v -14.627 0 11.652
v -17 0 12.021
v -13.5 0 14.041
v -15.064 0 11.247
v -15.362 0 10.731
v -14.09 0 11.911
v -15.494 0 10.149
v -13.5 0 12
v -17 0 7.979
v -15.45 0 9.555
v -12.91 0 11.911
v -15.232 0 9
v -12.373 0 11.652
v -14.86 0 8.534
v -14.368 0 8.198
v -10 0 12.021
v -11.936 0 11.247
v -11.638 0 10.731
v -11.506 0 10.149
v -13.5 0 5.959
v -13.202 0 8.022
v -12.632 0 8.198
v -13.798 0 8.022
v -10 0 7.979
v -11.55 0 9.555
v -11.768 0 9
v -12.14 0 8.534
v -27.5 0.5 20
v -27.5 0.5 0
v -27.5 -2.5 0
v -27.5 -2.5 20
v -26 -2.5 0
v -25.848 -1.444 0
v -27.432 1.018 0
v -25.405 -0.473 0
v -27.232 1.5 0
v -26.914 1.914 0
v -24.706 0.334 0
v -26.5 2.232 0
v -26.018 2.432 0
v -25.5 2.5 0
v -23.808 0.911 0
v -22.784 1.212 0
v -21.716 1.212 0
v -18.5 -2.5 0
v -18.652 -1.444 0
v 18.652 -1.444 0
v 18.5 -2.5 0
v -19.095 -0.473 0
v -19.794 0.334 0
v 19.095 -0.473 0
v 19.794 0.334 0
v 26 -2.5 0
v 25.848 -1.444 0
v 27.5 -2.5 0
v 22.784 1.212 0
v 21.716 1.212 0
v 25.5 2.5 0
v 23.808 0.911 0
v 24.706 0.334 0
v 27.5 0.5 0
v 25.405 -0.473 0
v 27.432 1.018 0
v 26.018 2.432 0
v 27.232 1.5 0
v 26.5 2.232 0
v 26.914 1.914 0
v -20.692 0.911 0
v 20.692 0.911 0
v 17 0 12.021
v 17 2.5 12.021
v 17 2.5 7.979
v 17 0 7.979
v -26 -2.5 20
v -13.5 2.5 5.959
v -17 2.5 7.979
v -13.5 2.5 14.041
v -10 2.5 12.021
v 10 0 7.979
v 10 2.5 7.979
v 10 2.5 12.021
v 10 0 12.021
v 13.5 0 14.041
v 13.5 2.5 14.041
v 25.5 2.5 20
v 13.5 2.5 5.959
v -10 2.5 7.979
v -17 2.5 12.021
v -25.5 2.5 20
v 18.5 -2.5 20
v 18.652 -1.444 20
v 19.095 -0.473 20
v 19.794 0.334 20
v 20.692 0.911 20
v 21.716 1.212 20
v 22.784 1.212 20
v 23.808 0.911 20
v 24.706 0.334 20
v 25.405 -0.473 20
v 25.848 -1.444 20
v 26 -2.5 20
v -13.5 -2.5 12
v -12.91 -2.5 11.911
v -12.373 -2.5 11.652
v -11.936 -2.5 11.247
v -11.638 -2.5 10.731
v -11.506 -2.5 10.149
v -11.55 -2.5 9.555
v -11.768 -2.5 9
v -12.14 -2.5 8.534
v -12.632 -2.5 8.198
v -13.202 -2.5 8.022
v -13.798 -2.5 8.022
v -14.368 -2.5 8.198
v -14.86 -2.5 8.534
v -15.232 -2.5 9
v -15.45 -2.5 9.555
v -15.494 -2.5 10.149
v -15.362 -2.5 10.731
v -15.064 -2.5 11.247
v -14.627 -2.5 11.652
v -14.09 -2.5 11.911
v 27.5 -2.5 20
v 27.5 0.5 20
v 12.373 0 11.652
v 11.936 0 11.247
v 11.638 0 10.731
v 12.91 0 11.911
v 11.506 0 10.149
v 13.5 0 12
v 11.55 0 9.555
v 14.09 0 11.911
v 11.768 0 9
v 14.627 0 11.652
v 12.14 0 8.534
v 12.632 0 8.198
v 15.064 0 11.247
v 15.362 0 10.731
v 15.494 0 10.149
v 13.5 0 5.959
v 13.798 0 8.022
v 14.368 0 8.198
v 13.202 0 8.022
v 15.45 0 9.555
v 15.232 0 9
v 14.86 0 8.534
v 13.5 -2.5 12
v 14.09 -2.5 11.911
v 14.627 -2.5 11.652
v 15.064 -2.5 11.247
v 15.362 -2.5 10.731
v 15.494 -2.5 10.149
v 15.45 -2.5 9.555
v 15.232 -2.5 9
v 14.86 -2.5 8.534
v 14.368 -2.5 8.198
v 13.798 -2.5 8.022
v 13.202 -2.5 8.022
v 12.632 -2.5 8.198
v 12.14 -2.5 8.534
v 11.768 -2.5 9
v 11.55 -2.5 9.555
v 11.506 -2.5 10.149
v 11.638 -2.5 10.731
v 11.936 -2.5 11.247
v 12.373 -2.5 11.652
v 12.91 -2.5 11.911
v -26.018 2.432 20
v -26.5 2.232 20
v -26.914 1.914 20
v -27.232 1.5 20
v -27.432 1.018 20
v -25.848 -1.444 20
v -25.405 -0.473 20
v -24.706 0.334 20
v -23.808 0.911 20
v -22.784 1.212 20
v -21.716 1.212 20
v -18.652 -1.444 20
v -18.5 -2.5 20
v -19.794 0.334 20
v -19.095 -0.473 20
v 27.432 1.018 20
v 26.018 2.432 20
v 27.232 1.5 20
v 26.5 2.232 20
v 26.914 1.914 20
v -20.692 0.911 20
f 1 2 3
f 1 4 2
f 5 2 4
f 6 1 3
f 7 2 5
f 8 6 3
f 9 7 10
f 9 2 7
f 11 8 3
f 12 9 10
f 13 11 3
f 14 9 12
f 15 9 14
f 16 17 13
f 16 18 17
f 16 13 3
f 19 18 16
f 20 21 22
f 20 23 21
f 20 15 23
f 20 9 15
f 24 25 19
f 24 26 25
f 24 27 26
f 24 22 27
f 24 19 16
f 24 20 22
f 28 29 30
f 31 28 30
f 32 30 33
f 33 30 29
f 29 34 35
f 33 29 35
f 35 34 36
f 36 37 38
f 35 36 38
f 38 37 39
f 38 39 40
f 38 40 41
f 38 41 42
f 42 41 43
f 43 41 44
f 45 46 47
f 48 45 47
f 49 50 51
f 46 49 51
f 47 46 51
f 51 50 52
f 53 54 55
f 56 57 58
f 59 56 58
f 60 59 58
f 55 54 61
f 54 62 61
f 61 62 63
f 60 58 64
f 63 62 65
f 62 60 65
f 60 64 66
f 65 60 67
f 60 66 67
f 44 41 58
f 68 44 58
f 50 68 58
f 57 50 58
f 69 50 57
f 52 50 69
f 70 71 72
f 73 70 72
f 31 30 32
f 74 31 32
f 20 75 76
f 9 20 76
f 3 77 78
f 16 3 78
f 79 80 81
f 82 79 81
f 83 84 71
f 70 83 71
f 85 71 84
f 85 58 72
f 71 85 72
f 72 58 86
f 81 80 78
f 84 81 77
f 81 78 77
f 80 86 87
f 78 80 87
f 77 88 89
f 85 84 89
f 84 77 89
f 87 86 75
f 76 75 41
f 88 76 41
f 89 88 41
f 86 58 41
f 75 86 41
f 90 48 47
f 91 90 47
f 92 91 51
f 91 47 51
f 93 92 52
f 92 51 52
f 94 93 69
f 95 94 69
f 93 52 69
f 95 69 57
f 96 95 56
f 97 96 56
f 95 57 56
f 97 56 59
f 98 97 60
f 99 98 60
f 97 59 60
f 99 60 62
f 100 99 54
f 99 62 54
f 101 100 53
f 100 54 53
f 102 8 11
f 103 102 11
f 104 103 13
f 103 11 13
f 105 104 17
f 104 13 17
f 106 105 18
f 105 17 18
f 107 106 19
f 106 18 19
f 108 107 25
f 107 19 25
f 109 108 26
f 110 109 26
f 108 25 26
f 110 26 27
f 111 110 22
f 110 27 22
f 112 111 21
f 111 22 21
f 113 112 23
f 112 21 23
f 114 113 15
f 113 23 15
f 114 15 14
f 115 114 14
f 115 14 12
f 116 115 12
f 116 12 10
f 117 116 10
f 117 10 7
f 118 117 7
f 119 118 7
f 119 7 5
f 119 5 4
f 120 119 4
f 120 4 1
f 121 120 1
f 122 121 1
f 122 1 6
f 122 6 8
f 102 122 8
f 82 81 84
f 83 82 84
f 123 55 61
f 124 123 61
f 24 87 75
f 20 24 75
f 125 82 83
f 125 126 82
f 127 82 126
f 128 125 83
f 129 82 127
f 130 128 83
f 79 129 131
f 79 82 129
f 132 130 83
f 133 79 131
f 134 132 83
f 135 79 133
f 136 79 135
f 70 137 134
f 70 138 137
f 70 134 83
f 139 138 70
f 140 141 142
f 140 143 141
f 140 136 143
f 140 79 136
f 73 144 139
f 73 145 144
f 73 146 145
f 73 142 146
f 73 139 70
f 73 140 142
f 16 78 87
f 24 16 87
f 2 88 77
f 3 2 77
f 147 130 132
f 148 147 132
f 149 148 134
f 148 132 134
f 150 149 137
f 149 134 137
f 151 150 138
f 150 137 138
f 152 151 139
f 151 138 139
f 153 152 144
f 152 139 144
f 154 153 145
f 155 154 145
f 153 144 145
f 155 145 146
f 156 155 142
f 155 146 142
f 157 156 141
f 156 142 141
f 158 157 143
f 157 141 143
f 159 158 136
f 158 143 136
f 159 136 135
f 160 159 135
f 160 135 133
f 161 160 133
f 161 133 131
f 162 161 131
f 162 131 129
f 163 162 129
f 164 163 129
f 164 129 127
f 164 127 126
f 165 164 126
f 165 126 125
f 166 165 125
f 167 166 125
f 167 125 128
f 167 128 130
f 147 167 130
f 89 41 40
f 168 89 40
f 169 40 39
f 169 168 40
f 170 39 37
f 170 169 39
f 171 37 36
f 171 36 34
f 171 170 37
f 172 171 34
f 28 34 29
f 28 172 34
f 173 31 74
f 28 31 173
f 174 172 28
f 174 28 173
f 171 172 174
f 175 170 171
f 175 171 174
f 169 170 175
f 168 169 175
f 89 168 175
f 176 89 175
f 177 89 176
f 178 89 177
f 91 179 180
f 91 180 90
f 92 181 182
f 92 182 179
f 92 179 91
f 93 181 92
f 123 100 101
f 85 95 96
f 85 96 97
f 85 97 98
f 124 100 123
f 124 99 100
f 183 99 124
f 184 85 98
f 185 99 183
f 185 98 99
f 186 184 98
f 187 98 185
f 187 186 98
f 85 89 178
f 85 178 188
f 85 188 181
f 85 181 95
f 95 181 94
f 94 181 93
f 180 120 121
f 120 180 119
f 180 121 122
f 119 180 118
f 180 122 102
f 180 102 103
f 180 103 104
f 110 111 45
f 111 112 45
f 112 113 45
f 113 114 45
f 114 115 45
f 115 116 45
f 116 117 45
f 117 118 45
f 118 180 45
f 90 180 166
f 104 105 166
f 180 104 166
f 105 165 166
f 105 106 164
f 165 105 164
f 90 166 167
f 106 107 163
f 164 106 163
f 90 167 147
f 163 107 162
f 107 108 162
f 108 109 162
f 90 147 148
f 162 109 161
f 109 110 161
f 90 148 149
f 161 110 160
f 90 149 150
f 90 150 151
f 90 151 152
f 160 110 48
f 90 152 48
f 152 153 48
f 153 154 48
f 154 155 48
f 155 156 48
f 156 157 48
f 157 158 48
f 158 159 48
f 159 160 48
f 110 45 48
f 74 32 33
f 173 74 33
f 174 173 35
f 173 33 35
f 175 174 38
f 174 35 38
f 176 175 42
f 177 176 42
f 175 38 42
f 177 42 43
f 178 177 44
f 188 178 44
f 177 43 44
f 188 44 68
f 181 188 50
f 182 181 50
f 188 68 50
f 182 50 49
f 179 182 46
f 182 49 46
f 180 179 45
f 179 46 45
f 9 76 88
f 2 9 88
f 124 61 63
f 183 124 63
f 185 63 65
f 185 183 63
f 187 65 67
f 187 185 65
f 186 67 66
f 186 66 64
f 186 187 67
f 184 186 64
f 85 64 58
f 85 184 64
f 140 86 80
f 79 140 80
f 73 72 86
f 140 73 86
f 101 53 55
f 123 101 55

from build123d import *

# Parameters (mm, degrees)
EXTRUDE_1_DEPTH     = 20
FILLET_1_R          = 2
SKETCH_2_R          = 2
CUT_EXTRUDE_1_DEPTH = 35.369317712
CUT_EXTRUDE_2_DEPTH = 2.5


with BuildPart() as part:
    # 草圖1 → 填料-伸長1 (new body)
    with BuildSketch(Plane.XY):
        with BuildLine():
            Line((-18.5, -2.5), (18.5, -2.5))
            ThreePointArc((18.5, -2.5), (22.25, 1.25), (26, -2.5))
            Line((26, -2.5), (27.5, -2.5))
            Line((27.5, -2.5), (27.5, 2.5))
            Line((27.5, 2.5), (-27.5, 2.5))
            Line((-27.5, 2.5), (-27.5, -2.5))
            Line((-27.5, -2.5), (-26, -2.5))
            ThreePointArc((-26, -2.5), (-22.25, 1.25), (-18.5, -2.5))
        make_face()
    extrude(amount=EXTRUDE_1_DEPTH)

    # 圓角1
    fillet_1_edges = [part.edges().sort_by_distance(p)[0] for p in [
        (-27.5, 2.5, 10),
        (27.5, 2.5, 10),
    ]]
    fillet(fillet_1_edges, radius=FILLET_1_R)

    # 草圖2 → 除料-伸長1 (cut, through all)
    with BuildSketch(Plane(origin=(0, 2.5, 0), x_dir=(1, 0, 0), z_dir=(0, 1, 0))):
        with Locations(Location((13.5, -10, 0), (0, 0, 270))):
            Circle(SKETCH_2_R)
        with Locations(Location((-13.5, -10, 0), (0, 0, 270))):
            Circle(SKETCH_2_R)
    extrude(amount=-CUT_EXTRUDE_1_DEPTH, mode=Mode.SUBTRACT)

    # 草圖3 → 除料-伸長2 (cut)
    with BuildSketch(Plane(origin=(0, 2.5, 0), x_dir=(1, 0, 0), z_dir=(0, 1, 0))):
        Polygon((13.5, -5.958548116), (10, -7.979274058), (10, -12.020725942), (13.5, -14.041451884), (17, -12.020725942), (17, -7.979274058), align=None)
        Polygon((-13.5, -5.958548116), (-17, -7.979274058), (-17, -12.020725942), (-13.5, -14.041451884), (-10, -12.020725942), (-10, -7.979274058), align=None)
    extrude(amount=-CUT_EXTRUDE_2_DEPTH, mode=Mode.SUBTRACT)


solid = part.part
